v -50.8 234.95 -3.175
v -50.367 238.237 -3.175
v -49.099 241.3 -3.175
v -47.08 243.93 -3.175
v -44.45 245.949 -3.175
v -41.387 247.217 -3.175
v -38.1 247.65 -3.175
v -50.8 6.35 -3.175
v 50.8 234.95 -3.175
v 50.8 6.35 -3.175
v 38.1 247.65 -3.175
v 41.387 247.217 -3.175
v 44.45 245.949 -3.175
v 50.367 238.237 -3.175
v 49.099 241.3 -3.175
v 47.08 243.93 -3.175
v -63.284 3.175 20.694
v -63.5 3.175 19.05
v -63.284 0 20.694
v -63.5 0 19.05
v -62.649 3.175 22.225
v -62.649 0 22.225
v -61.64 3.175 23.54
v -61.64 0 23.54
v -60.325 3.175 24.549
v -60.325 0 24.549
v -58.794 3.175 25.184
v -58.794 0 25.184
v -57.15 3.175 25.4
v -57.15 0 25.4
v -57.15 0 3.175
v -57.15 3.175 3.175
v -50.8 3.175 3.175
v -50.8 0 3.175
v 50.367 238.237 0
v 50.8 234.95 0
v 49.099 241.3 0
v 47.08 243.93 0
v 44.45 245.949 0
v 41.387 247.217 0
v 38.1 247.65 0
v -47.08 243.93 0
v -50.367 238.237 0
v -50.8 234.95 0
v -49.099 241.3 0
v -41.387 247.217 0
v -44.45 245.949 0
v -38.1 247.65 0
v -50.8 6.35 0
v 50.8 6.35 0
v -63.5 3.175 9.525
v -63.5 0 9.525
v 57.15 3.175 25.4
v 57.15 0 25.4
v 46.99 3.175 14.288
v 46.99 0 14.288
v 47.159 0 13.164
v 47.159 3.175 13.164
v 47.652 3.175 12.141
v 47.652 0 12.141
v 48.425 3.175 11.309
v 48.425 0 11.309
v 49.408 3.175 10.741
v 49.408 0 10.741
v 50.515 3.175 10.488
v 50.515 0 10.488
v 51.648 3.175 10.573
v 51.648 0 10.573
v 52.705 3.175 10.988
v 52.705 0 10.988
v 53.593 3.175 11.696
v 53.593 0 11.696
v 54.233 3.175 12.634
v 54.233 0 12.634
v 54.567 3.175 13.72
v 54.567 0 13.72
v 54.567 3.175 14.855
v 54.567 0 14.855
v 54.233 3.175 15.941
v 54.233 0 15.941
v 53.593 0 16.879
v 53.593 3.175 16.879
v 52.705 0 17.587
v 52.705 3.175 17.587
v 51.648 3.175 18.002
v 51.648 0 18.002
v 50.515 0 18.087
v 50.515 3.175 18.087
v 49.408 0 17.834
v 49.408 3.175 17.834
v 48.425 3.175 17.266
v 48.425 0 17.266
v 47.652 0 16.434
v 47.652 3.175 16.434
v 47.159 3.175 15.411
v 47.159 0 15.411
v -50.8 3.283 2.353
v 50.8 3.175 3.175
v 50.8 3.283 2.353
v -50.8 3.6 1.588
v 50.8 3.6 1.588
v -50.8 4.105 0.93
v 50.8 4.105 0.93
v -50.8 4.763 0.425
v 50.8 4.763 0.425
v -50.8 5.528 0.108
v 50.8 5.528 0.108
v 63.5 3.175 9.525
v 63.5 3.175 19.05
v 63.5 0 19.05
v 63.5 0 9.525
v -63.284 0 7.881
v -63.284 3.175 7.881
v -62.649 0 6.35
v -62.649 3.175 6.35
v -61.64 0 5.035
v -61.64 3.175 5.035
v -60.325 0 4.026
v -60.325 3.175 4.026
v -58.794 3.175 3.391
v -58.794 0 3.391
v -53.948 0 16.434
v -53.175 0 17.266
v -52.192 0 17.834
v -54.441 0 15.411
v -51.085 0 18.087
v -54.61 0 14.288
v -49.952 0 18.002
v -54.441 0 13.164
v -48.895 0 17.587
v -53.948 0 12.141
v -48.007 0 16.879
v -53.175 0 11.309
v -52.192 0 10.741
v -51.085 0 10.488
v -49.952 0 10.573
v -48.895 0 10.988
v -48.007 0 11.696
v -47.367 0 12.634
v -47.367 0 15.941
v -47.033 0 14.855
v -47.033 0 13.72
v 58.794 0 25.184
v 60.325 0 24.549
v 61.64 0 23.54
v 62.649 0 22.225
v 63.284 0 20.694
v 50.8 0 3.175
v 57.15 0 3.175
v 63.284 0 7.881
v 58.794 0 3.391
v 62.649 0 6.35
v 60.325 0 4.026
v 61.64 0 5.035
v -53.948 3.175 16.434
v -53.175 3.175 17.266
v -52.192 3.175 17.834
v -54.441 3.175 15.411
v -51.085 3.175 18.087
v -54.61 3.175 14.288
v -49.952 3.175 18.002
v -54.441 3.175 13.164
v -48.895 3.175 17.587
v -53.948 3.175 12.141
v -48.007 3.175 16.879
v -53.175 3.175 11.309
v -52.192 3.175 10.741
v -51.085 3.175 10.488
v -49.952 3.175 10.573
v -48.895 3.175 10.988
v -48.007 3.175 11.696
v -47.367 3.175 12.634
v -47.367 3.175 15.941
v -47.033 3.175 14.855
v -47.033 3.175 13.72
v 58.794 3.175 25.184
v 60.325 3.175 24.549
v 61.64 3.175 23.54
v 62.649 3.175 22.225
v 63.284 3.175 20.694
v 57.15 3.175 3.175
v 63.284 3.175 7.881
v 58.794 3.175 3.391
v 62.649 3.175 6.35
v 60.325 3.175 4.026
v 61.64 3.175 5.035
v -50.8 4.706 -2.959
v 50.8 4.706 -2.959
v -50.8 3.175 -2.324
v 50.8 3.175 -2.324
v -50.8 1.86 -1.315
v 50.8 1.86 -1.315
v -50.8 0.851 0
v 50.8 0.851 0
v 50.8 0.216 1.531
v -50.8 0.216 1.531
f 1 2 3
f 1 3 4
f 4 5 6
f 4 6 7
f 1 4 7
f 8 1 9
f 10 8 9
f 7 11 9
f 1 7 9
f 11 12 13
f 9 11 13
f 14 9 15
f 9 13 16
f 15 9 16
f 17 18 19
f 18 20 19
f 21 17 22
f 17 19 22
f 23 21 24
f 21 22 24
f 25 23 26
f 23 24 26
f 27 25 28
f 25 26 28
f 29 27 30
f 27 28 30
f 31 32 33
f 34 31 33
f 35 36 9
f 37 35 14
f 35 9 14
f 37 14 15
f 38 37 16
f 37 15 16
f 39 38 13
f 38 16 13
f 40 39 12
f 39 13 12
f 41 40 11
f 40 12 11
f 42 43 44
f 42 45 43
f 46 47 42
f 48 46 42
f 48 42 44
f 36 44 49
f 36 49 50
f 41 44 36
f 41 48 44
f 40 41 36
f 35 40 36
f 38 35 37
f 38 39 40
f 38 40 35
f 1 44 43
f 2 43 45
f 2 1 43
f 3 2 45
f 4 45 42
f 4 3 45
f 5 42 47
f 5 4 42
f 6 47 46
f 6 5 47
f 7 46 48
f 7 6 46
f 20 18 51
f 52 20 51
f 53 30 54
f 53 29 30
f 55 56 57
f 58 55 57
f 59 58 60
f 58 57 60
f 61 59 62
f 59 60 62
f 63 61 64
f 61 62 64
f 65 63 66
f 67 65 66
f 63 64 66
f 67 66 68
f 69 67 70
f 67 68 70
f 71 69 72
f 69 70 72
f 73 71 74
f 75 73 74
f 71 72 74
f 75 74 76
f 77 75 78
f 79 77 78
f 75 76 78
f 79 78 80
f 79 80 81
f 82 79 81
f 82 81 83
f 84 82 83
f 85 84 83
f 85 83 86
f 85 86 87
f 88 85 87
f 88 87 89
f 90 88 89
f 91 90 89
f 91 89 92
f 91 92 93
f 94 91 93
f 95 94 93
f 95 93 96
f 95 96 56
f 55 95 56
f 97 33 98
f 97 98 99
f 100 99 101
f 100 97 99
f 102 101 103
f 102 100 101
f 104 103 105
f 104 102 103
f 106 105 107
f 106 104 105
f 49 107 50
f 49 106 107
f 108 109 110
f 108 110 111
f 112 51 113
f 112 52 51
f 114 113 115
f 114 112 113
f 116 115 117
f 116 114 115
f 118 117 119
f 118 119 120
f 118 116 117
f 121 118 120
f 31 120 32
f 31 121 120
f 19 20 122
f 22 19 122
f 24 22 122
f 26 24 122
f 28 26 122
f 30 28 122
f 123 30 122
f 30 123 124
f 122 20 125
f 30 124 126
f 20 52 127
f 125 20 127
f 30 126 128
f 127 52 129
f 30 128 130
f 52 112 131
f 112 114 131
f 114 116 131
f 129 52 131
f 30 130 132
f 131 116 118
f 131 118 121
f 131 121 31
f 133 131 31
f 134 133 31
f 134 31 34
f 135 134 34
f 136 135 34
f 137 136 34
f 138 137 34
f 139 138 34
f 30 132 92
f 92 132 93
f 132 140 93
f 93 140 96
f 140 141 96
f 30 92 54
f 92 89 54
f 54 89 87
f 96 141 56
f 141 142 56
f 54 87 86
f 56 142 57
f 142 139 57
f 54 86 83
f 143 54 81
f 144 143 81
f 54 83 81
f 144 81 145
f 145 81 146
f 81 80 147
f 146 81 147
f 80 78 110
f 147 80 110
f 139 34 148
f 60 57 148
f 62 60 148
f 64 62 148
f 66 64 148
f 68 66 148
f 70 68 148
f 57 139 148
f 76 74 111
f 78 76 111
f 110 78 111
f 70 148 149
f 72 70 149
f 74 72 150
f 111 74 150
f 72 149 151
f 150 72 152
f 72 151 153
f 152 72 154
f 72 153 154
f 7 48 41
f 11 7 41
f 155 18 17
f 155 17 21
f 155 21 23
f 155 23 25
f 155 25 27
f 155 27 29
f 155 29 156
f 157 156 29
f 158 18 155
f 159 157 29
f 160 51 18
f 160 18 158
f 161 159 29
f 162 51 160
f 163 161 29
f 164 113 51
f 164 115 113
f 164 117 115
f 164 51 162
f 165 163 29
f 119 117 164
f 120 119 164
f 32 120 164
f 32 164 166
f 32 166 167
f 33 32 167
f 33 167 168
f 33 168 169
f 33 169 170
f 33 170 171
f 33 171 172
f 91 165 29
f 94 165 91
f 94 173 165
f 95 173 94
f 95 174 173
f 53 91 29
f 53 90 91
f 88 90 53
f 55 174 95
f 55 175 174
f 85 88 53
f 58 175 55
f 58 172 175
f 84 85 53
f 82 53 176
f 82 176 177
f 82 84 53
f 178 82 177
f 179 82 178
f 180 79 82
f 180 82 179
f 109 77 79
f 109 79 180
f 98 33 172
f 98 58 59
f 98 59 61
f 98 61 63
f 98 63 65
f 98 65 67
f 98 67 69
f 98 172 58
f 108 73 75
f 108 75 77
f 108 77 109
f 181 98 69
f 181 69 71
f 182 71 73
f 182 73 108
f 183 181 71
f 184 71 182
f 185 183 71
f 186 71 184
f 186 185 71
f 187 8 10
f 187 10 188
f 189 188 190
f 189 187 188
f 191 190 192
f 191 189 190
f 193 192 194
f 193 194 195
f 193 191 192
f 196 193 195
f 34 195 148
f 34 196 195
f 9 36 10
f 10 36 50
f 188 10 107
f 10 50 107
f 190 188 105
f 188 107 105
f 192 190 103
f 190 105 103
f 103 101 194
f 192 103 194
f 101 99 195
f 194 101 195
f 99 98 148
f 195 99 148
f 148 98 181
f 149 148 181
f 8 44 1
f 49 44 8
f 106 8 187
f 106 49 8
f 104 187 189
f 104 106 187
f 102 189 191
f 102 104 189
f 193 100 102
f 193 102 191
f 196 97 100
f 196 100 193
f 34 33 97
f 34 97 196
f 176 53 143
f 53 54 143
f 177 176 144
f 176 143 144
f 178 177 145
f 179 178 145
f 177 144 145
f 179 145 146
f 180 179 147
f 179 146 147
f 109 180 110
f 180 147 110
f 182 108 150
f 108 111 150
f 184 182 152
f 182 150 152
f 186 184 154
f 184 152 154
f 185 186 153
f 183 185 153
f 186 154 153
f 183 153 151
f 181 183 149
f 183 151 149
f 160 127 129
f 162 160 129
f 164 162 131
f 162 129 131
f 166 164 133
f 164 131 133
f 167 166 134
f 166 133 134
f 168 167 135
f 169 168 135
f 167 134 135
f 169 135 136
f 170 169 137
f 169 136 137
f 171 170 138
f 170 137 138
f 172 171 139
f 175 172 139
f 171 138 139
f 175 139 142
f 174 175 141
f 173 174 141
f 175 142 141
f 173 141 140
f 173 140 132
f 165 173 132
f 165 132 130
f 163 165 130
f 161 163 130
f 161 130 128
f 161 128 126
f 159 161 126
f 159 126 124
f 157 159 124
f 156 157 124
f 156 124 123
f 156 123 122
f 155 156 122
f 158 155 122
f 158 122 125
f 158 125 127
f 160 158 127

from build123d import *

# Parameters (mm, degrees)
SKETCH1_W                    = 101.6
SKETCH1_H                    = 247.65
BASE_FLANGE1_DEPTH           = 3.175
EDGE_FLANGE1_STRIP_W         = 19.05
EDGE_FLANGE1_STRIP_H         = 3.175
EDGE_FLANGE1_STRIP_CUT_DEPTH = 101.6
EDGE_FLANGE1_DEPTH           = 101.6
FILLET1_R                    = 12.7
SKETCH9_W                    = 127
SKETCH9_H                    = 22.225
BOSS_EXTRUDE1_DEPTH          = 3.175
F_1_4_CLEARANCE_HOLE1_D      = 7.62
FILLET3_R                    = 6.35


# Sheet-metal steps are written as plain solids
with BuildPart() as part:
    # Sketch1 → Base-Flange1 (new body)
    with BuildSketch(Plane.XY):
        with Locations((0, 123.825)):
            Rectangle(SKETCH1_W, SKETCH1_H)
    extrude(amount=-BASE_FLANGE1_DEPTH)

    # Edge-Flange1 strip (across the edge) → Edge-Flange1 strip cut (cut)
    with BuildSketch(Plane.YZ.offset(-50.8)):
        with Locations((-3.175, -1.5875)):
            Rectangle(EDGE_FLANGE1_STRIP_W, EDGE_FLANGE1_STRIP_H)
    extrude(amount=EDGE_FLANGE1_STRIP_CUT_DEPTH, mode=Mode.SUBTRACT)

    # Edge-Flange1 section (across the edge) → Edge-Flange1 (add)
    with BuildSketch(Plane.YZ.offset(-50.8)):
        with BuildLine():
            Line((0, 3.175), (0, 25.4))
            Line((0, 25.4), (3.175, 25.4))
            Line((3.175, 25.4), (3.175, 3.175))
            ThreePointArc((3.175, 3.175), (4.10493597, 0.92993597), (6.35, 0))
            Line((6.35, 0), (6.35, -3.175))
            ThreePointArc((6.35, -3.175), (1.859871939, -1.315128061), (0, 3.175))
        make_face()
    extrude(amount=EDGE_FLANGE1_DEPTH)

    # Fillet1
    fillet1_edges = [part.edges().sort_by_distance(p)[0] for p in [
        (-50.8, 247.65, -1.5875),
        (50.8, 247.65, -1.5875),
    ]]
    fillet(fillet1_edges, radius=FILLET1_R)

    # Sketch9 → Boss-Extrude1 (add)
    with BuildSketch(Plane(origin=(0, 3.175, 0), x_dir=(1, 0, 0), z_dir=(0, 1, 0))):
        with Locations((0, -14.2875)):
            Rectangle(SKETCH9_W, SKETCH9_H)
    extrude(amount=-BOSS_EXTRUDE1_DEPTH)

    # 1/4 Clearance Hole1 (through all)
    with Locations(Plane(origin=(0, 3.175, 0), x_dir=(1, 0, 0), z_dir=(0, 1, 0))):
        with Locations((-50.8, -14.2875), (50.8, -14.2875)):
            Hole(F_1_4_CLEARANCE_HOLE1_D / 2)

    # Fillet3
    fillet3_edges = [part.edges().sort_by_distance(p)[0] for p in [
        (-63.5, 1.5875, 3.175),
        (63.5, 1.5875, 25.4),
        (-63.5, 1.5875, 25.4),
        (63.5, 1.5875, 3.175),
    ]]
    fillet(fillet3_edges, radius=FILLET3_R)


solid = part.part
